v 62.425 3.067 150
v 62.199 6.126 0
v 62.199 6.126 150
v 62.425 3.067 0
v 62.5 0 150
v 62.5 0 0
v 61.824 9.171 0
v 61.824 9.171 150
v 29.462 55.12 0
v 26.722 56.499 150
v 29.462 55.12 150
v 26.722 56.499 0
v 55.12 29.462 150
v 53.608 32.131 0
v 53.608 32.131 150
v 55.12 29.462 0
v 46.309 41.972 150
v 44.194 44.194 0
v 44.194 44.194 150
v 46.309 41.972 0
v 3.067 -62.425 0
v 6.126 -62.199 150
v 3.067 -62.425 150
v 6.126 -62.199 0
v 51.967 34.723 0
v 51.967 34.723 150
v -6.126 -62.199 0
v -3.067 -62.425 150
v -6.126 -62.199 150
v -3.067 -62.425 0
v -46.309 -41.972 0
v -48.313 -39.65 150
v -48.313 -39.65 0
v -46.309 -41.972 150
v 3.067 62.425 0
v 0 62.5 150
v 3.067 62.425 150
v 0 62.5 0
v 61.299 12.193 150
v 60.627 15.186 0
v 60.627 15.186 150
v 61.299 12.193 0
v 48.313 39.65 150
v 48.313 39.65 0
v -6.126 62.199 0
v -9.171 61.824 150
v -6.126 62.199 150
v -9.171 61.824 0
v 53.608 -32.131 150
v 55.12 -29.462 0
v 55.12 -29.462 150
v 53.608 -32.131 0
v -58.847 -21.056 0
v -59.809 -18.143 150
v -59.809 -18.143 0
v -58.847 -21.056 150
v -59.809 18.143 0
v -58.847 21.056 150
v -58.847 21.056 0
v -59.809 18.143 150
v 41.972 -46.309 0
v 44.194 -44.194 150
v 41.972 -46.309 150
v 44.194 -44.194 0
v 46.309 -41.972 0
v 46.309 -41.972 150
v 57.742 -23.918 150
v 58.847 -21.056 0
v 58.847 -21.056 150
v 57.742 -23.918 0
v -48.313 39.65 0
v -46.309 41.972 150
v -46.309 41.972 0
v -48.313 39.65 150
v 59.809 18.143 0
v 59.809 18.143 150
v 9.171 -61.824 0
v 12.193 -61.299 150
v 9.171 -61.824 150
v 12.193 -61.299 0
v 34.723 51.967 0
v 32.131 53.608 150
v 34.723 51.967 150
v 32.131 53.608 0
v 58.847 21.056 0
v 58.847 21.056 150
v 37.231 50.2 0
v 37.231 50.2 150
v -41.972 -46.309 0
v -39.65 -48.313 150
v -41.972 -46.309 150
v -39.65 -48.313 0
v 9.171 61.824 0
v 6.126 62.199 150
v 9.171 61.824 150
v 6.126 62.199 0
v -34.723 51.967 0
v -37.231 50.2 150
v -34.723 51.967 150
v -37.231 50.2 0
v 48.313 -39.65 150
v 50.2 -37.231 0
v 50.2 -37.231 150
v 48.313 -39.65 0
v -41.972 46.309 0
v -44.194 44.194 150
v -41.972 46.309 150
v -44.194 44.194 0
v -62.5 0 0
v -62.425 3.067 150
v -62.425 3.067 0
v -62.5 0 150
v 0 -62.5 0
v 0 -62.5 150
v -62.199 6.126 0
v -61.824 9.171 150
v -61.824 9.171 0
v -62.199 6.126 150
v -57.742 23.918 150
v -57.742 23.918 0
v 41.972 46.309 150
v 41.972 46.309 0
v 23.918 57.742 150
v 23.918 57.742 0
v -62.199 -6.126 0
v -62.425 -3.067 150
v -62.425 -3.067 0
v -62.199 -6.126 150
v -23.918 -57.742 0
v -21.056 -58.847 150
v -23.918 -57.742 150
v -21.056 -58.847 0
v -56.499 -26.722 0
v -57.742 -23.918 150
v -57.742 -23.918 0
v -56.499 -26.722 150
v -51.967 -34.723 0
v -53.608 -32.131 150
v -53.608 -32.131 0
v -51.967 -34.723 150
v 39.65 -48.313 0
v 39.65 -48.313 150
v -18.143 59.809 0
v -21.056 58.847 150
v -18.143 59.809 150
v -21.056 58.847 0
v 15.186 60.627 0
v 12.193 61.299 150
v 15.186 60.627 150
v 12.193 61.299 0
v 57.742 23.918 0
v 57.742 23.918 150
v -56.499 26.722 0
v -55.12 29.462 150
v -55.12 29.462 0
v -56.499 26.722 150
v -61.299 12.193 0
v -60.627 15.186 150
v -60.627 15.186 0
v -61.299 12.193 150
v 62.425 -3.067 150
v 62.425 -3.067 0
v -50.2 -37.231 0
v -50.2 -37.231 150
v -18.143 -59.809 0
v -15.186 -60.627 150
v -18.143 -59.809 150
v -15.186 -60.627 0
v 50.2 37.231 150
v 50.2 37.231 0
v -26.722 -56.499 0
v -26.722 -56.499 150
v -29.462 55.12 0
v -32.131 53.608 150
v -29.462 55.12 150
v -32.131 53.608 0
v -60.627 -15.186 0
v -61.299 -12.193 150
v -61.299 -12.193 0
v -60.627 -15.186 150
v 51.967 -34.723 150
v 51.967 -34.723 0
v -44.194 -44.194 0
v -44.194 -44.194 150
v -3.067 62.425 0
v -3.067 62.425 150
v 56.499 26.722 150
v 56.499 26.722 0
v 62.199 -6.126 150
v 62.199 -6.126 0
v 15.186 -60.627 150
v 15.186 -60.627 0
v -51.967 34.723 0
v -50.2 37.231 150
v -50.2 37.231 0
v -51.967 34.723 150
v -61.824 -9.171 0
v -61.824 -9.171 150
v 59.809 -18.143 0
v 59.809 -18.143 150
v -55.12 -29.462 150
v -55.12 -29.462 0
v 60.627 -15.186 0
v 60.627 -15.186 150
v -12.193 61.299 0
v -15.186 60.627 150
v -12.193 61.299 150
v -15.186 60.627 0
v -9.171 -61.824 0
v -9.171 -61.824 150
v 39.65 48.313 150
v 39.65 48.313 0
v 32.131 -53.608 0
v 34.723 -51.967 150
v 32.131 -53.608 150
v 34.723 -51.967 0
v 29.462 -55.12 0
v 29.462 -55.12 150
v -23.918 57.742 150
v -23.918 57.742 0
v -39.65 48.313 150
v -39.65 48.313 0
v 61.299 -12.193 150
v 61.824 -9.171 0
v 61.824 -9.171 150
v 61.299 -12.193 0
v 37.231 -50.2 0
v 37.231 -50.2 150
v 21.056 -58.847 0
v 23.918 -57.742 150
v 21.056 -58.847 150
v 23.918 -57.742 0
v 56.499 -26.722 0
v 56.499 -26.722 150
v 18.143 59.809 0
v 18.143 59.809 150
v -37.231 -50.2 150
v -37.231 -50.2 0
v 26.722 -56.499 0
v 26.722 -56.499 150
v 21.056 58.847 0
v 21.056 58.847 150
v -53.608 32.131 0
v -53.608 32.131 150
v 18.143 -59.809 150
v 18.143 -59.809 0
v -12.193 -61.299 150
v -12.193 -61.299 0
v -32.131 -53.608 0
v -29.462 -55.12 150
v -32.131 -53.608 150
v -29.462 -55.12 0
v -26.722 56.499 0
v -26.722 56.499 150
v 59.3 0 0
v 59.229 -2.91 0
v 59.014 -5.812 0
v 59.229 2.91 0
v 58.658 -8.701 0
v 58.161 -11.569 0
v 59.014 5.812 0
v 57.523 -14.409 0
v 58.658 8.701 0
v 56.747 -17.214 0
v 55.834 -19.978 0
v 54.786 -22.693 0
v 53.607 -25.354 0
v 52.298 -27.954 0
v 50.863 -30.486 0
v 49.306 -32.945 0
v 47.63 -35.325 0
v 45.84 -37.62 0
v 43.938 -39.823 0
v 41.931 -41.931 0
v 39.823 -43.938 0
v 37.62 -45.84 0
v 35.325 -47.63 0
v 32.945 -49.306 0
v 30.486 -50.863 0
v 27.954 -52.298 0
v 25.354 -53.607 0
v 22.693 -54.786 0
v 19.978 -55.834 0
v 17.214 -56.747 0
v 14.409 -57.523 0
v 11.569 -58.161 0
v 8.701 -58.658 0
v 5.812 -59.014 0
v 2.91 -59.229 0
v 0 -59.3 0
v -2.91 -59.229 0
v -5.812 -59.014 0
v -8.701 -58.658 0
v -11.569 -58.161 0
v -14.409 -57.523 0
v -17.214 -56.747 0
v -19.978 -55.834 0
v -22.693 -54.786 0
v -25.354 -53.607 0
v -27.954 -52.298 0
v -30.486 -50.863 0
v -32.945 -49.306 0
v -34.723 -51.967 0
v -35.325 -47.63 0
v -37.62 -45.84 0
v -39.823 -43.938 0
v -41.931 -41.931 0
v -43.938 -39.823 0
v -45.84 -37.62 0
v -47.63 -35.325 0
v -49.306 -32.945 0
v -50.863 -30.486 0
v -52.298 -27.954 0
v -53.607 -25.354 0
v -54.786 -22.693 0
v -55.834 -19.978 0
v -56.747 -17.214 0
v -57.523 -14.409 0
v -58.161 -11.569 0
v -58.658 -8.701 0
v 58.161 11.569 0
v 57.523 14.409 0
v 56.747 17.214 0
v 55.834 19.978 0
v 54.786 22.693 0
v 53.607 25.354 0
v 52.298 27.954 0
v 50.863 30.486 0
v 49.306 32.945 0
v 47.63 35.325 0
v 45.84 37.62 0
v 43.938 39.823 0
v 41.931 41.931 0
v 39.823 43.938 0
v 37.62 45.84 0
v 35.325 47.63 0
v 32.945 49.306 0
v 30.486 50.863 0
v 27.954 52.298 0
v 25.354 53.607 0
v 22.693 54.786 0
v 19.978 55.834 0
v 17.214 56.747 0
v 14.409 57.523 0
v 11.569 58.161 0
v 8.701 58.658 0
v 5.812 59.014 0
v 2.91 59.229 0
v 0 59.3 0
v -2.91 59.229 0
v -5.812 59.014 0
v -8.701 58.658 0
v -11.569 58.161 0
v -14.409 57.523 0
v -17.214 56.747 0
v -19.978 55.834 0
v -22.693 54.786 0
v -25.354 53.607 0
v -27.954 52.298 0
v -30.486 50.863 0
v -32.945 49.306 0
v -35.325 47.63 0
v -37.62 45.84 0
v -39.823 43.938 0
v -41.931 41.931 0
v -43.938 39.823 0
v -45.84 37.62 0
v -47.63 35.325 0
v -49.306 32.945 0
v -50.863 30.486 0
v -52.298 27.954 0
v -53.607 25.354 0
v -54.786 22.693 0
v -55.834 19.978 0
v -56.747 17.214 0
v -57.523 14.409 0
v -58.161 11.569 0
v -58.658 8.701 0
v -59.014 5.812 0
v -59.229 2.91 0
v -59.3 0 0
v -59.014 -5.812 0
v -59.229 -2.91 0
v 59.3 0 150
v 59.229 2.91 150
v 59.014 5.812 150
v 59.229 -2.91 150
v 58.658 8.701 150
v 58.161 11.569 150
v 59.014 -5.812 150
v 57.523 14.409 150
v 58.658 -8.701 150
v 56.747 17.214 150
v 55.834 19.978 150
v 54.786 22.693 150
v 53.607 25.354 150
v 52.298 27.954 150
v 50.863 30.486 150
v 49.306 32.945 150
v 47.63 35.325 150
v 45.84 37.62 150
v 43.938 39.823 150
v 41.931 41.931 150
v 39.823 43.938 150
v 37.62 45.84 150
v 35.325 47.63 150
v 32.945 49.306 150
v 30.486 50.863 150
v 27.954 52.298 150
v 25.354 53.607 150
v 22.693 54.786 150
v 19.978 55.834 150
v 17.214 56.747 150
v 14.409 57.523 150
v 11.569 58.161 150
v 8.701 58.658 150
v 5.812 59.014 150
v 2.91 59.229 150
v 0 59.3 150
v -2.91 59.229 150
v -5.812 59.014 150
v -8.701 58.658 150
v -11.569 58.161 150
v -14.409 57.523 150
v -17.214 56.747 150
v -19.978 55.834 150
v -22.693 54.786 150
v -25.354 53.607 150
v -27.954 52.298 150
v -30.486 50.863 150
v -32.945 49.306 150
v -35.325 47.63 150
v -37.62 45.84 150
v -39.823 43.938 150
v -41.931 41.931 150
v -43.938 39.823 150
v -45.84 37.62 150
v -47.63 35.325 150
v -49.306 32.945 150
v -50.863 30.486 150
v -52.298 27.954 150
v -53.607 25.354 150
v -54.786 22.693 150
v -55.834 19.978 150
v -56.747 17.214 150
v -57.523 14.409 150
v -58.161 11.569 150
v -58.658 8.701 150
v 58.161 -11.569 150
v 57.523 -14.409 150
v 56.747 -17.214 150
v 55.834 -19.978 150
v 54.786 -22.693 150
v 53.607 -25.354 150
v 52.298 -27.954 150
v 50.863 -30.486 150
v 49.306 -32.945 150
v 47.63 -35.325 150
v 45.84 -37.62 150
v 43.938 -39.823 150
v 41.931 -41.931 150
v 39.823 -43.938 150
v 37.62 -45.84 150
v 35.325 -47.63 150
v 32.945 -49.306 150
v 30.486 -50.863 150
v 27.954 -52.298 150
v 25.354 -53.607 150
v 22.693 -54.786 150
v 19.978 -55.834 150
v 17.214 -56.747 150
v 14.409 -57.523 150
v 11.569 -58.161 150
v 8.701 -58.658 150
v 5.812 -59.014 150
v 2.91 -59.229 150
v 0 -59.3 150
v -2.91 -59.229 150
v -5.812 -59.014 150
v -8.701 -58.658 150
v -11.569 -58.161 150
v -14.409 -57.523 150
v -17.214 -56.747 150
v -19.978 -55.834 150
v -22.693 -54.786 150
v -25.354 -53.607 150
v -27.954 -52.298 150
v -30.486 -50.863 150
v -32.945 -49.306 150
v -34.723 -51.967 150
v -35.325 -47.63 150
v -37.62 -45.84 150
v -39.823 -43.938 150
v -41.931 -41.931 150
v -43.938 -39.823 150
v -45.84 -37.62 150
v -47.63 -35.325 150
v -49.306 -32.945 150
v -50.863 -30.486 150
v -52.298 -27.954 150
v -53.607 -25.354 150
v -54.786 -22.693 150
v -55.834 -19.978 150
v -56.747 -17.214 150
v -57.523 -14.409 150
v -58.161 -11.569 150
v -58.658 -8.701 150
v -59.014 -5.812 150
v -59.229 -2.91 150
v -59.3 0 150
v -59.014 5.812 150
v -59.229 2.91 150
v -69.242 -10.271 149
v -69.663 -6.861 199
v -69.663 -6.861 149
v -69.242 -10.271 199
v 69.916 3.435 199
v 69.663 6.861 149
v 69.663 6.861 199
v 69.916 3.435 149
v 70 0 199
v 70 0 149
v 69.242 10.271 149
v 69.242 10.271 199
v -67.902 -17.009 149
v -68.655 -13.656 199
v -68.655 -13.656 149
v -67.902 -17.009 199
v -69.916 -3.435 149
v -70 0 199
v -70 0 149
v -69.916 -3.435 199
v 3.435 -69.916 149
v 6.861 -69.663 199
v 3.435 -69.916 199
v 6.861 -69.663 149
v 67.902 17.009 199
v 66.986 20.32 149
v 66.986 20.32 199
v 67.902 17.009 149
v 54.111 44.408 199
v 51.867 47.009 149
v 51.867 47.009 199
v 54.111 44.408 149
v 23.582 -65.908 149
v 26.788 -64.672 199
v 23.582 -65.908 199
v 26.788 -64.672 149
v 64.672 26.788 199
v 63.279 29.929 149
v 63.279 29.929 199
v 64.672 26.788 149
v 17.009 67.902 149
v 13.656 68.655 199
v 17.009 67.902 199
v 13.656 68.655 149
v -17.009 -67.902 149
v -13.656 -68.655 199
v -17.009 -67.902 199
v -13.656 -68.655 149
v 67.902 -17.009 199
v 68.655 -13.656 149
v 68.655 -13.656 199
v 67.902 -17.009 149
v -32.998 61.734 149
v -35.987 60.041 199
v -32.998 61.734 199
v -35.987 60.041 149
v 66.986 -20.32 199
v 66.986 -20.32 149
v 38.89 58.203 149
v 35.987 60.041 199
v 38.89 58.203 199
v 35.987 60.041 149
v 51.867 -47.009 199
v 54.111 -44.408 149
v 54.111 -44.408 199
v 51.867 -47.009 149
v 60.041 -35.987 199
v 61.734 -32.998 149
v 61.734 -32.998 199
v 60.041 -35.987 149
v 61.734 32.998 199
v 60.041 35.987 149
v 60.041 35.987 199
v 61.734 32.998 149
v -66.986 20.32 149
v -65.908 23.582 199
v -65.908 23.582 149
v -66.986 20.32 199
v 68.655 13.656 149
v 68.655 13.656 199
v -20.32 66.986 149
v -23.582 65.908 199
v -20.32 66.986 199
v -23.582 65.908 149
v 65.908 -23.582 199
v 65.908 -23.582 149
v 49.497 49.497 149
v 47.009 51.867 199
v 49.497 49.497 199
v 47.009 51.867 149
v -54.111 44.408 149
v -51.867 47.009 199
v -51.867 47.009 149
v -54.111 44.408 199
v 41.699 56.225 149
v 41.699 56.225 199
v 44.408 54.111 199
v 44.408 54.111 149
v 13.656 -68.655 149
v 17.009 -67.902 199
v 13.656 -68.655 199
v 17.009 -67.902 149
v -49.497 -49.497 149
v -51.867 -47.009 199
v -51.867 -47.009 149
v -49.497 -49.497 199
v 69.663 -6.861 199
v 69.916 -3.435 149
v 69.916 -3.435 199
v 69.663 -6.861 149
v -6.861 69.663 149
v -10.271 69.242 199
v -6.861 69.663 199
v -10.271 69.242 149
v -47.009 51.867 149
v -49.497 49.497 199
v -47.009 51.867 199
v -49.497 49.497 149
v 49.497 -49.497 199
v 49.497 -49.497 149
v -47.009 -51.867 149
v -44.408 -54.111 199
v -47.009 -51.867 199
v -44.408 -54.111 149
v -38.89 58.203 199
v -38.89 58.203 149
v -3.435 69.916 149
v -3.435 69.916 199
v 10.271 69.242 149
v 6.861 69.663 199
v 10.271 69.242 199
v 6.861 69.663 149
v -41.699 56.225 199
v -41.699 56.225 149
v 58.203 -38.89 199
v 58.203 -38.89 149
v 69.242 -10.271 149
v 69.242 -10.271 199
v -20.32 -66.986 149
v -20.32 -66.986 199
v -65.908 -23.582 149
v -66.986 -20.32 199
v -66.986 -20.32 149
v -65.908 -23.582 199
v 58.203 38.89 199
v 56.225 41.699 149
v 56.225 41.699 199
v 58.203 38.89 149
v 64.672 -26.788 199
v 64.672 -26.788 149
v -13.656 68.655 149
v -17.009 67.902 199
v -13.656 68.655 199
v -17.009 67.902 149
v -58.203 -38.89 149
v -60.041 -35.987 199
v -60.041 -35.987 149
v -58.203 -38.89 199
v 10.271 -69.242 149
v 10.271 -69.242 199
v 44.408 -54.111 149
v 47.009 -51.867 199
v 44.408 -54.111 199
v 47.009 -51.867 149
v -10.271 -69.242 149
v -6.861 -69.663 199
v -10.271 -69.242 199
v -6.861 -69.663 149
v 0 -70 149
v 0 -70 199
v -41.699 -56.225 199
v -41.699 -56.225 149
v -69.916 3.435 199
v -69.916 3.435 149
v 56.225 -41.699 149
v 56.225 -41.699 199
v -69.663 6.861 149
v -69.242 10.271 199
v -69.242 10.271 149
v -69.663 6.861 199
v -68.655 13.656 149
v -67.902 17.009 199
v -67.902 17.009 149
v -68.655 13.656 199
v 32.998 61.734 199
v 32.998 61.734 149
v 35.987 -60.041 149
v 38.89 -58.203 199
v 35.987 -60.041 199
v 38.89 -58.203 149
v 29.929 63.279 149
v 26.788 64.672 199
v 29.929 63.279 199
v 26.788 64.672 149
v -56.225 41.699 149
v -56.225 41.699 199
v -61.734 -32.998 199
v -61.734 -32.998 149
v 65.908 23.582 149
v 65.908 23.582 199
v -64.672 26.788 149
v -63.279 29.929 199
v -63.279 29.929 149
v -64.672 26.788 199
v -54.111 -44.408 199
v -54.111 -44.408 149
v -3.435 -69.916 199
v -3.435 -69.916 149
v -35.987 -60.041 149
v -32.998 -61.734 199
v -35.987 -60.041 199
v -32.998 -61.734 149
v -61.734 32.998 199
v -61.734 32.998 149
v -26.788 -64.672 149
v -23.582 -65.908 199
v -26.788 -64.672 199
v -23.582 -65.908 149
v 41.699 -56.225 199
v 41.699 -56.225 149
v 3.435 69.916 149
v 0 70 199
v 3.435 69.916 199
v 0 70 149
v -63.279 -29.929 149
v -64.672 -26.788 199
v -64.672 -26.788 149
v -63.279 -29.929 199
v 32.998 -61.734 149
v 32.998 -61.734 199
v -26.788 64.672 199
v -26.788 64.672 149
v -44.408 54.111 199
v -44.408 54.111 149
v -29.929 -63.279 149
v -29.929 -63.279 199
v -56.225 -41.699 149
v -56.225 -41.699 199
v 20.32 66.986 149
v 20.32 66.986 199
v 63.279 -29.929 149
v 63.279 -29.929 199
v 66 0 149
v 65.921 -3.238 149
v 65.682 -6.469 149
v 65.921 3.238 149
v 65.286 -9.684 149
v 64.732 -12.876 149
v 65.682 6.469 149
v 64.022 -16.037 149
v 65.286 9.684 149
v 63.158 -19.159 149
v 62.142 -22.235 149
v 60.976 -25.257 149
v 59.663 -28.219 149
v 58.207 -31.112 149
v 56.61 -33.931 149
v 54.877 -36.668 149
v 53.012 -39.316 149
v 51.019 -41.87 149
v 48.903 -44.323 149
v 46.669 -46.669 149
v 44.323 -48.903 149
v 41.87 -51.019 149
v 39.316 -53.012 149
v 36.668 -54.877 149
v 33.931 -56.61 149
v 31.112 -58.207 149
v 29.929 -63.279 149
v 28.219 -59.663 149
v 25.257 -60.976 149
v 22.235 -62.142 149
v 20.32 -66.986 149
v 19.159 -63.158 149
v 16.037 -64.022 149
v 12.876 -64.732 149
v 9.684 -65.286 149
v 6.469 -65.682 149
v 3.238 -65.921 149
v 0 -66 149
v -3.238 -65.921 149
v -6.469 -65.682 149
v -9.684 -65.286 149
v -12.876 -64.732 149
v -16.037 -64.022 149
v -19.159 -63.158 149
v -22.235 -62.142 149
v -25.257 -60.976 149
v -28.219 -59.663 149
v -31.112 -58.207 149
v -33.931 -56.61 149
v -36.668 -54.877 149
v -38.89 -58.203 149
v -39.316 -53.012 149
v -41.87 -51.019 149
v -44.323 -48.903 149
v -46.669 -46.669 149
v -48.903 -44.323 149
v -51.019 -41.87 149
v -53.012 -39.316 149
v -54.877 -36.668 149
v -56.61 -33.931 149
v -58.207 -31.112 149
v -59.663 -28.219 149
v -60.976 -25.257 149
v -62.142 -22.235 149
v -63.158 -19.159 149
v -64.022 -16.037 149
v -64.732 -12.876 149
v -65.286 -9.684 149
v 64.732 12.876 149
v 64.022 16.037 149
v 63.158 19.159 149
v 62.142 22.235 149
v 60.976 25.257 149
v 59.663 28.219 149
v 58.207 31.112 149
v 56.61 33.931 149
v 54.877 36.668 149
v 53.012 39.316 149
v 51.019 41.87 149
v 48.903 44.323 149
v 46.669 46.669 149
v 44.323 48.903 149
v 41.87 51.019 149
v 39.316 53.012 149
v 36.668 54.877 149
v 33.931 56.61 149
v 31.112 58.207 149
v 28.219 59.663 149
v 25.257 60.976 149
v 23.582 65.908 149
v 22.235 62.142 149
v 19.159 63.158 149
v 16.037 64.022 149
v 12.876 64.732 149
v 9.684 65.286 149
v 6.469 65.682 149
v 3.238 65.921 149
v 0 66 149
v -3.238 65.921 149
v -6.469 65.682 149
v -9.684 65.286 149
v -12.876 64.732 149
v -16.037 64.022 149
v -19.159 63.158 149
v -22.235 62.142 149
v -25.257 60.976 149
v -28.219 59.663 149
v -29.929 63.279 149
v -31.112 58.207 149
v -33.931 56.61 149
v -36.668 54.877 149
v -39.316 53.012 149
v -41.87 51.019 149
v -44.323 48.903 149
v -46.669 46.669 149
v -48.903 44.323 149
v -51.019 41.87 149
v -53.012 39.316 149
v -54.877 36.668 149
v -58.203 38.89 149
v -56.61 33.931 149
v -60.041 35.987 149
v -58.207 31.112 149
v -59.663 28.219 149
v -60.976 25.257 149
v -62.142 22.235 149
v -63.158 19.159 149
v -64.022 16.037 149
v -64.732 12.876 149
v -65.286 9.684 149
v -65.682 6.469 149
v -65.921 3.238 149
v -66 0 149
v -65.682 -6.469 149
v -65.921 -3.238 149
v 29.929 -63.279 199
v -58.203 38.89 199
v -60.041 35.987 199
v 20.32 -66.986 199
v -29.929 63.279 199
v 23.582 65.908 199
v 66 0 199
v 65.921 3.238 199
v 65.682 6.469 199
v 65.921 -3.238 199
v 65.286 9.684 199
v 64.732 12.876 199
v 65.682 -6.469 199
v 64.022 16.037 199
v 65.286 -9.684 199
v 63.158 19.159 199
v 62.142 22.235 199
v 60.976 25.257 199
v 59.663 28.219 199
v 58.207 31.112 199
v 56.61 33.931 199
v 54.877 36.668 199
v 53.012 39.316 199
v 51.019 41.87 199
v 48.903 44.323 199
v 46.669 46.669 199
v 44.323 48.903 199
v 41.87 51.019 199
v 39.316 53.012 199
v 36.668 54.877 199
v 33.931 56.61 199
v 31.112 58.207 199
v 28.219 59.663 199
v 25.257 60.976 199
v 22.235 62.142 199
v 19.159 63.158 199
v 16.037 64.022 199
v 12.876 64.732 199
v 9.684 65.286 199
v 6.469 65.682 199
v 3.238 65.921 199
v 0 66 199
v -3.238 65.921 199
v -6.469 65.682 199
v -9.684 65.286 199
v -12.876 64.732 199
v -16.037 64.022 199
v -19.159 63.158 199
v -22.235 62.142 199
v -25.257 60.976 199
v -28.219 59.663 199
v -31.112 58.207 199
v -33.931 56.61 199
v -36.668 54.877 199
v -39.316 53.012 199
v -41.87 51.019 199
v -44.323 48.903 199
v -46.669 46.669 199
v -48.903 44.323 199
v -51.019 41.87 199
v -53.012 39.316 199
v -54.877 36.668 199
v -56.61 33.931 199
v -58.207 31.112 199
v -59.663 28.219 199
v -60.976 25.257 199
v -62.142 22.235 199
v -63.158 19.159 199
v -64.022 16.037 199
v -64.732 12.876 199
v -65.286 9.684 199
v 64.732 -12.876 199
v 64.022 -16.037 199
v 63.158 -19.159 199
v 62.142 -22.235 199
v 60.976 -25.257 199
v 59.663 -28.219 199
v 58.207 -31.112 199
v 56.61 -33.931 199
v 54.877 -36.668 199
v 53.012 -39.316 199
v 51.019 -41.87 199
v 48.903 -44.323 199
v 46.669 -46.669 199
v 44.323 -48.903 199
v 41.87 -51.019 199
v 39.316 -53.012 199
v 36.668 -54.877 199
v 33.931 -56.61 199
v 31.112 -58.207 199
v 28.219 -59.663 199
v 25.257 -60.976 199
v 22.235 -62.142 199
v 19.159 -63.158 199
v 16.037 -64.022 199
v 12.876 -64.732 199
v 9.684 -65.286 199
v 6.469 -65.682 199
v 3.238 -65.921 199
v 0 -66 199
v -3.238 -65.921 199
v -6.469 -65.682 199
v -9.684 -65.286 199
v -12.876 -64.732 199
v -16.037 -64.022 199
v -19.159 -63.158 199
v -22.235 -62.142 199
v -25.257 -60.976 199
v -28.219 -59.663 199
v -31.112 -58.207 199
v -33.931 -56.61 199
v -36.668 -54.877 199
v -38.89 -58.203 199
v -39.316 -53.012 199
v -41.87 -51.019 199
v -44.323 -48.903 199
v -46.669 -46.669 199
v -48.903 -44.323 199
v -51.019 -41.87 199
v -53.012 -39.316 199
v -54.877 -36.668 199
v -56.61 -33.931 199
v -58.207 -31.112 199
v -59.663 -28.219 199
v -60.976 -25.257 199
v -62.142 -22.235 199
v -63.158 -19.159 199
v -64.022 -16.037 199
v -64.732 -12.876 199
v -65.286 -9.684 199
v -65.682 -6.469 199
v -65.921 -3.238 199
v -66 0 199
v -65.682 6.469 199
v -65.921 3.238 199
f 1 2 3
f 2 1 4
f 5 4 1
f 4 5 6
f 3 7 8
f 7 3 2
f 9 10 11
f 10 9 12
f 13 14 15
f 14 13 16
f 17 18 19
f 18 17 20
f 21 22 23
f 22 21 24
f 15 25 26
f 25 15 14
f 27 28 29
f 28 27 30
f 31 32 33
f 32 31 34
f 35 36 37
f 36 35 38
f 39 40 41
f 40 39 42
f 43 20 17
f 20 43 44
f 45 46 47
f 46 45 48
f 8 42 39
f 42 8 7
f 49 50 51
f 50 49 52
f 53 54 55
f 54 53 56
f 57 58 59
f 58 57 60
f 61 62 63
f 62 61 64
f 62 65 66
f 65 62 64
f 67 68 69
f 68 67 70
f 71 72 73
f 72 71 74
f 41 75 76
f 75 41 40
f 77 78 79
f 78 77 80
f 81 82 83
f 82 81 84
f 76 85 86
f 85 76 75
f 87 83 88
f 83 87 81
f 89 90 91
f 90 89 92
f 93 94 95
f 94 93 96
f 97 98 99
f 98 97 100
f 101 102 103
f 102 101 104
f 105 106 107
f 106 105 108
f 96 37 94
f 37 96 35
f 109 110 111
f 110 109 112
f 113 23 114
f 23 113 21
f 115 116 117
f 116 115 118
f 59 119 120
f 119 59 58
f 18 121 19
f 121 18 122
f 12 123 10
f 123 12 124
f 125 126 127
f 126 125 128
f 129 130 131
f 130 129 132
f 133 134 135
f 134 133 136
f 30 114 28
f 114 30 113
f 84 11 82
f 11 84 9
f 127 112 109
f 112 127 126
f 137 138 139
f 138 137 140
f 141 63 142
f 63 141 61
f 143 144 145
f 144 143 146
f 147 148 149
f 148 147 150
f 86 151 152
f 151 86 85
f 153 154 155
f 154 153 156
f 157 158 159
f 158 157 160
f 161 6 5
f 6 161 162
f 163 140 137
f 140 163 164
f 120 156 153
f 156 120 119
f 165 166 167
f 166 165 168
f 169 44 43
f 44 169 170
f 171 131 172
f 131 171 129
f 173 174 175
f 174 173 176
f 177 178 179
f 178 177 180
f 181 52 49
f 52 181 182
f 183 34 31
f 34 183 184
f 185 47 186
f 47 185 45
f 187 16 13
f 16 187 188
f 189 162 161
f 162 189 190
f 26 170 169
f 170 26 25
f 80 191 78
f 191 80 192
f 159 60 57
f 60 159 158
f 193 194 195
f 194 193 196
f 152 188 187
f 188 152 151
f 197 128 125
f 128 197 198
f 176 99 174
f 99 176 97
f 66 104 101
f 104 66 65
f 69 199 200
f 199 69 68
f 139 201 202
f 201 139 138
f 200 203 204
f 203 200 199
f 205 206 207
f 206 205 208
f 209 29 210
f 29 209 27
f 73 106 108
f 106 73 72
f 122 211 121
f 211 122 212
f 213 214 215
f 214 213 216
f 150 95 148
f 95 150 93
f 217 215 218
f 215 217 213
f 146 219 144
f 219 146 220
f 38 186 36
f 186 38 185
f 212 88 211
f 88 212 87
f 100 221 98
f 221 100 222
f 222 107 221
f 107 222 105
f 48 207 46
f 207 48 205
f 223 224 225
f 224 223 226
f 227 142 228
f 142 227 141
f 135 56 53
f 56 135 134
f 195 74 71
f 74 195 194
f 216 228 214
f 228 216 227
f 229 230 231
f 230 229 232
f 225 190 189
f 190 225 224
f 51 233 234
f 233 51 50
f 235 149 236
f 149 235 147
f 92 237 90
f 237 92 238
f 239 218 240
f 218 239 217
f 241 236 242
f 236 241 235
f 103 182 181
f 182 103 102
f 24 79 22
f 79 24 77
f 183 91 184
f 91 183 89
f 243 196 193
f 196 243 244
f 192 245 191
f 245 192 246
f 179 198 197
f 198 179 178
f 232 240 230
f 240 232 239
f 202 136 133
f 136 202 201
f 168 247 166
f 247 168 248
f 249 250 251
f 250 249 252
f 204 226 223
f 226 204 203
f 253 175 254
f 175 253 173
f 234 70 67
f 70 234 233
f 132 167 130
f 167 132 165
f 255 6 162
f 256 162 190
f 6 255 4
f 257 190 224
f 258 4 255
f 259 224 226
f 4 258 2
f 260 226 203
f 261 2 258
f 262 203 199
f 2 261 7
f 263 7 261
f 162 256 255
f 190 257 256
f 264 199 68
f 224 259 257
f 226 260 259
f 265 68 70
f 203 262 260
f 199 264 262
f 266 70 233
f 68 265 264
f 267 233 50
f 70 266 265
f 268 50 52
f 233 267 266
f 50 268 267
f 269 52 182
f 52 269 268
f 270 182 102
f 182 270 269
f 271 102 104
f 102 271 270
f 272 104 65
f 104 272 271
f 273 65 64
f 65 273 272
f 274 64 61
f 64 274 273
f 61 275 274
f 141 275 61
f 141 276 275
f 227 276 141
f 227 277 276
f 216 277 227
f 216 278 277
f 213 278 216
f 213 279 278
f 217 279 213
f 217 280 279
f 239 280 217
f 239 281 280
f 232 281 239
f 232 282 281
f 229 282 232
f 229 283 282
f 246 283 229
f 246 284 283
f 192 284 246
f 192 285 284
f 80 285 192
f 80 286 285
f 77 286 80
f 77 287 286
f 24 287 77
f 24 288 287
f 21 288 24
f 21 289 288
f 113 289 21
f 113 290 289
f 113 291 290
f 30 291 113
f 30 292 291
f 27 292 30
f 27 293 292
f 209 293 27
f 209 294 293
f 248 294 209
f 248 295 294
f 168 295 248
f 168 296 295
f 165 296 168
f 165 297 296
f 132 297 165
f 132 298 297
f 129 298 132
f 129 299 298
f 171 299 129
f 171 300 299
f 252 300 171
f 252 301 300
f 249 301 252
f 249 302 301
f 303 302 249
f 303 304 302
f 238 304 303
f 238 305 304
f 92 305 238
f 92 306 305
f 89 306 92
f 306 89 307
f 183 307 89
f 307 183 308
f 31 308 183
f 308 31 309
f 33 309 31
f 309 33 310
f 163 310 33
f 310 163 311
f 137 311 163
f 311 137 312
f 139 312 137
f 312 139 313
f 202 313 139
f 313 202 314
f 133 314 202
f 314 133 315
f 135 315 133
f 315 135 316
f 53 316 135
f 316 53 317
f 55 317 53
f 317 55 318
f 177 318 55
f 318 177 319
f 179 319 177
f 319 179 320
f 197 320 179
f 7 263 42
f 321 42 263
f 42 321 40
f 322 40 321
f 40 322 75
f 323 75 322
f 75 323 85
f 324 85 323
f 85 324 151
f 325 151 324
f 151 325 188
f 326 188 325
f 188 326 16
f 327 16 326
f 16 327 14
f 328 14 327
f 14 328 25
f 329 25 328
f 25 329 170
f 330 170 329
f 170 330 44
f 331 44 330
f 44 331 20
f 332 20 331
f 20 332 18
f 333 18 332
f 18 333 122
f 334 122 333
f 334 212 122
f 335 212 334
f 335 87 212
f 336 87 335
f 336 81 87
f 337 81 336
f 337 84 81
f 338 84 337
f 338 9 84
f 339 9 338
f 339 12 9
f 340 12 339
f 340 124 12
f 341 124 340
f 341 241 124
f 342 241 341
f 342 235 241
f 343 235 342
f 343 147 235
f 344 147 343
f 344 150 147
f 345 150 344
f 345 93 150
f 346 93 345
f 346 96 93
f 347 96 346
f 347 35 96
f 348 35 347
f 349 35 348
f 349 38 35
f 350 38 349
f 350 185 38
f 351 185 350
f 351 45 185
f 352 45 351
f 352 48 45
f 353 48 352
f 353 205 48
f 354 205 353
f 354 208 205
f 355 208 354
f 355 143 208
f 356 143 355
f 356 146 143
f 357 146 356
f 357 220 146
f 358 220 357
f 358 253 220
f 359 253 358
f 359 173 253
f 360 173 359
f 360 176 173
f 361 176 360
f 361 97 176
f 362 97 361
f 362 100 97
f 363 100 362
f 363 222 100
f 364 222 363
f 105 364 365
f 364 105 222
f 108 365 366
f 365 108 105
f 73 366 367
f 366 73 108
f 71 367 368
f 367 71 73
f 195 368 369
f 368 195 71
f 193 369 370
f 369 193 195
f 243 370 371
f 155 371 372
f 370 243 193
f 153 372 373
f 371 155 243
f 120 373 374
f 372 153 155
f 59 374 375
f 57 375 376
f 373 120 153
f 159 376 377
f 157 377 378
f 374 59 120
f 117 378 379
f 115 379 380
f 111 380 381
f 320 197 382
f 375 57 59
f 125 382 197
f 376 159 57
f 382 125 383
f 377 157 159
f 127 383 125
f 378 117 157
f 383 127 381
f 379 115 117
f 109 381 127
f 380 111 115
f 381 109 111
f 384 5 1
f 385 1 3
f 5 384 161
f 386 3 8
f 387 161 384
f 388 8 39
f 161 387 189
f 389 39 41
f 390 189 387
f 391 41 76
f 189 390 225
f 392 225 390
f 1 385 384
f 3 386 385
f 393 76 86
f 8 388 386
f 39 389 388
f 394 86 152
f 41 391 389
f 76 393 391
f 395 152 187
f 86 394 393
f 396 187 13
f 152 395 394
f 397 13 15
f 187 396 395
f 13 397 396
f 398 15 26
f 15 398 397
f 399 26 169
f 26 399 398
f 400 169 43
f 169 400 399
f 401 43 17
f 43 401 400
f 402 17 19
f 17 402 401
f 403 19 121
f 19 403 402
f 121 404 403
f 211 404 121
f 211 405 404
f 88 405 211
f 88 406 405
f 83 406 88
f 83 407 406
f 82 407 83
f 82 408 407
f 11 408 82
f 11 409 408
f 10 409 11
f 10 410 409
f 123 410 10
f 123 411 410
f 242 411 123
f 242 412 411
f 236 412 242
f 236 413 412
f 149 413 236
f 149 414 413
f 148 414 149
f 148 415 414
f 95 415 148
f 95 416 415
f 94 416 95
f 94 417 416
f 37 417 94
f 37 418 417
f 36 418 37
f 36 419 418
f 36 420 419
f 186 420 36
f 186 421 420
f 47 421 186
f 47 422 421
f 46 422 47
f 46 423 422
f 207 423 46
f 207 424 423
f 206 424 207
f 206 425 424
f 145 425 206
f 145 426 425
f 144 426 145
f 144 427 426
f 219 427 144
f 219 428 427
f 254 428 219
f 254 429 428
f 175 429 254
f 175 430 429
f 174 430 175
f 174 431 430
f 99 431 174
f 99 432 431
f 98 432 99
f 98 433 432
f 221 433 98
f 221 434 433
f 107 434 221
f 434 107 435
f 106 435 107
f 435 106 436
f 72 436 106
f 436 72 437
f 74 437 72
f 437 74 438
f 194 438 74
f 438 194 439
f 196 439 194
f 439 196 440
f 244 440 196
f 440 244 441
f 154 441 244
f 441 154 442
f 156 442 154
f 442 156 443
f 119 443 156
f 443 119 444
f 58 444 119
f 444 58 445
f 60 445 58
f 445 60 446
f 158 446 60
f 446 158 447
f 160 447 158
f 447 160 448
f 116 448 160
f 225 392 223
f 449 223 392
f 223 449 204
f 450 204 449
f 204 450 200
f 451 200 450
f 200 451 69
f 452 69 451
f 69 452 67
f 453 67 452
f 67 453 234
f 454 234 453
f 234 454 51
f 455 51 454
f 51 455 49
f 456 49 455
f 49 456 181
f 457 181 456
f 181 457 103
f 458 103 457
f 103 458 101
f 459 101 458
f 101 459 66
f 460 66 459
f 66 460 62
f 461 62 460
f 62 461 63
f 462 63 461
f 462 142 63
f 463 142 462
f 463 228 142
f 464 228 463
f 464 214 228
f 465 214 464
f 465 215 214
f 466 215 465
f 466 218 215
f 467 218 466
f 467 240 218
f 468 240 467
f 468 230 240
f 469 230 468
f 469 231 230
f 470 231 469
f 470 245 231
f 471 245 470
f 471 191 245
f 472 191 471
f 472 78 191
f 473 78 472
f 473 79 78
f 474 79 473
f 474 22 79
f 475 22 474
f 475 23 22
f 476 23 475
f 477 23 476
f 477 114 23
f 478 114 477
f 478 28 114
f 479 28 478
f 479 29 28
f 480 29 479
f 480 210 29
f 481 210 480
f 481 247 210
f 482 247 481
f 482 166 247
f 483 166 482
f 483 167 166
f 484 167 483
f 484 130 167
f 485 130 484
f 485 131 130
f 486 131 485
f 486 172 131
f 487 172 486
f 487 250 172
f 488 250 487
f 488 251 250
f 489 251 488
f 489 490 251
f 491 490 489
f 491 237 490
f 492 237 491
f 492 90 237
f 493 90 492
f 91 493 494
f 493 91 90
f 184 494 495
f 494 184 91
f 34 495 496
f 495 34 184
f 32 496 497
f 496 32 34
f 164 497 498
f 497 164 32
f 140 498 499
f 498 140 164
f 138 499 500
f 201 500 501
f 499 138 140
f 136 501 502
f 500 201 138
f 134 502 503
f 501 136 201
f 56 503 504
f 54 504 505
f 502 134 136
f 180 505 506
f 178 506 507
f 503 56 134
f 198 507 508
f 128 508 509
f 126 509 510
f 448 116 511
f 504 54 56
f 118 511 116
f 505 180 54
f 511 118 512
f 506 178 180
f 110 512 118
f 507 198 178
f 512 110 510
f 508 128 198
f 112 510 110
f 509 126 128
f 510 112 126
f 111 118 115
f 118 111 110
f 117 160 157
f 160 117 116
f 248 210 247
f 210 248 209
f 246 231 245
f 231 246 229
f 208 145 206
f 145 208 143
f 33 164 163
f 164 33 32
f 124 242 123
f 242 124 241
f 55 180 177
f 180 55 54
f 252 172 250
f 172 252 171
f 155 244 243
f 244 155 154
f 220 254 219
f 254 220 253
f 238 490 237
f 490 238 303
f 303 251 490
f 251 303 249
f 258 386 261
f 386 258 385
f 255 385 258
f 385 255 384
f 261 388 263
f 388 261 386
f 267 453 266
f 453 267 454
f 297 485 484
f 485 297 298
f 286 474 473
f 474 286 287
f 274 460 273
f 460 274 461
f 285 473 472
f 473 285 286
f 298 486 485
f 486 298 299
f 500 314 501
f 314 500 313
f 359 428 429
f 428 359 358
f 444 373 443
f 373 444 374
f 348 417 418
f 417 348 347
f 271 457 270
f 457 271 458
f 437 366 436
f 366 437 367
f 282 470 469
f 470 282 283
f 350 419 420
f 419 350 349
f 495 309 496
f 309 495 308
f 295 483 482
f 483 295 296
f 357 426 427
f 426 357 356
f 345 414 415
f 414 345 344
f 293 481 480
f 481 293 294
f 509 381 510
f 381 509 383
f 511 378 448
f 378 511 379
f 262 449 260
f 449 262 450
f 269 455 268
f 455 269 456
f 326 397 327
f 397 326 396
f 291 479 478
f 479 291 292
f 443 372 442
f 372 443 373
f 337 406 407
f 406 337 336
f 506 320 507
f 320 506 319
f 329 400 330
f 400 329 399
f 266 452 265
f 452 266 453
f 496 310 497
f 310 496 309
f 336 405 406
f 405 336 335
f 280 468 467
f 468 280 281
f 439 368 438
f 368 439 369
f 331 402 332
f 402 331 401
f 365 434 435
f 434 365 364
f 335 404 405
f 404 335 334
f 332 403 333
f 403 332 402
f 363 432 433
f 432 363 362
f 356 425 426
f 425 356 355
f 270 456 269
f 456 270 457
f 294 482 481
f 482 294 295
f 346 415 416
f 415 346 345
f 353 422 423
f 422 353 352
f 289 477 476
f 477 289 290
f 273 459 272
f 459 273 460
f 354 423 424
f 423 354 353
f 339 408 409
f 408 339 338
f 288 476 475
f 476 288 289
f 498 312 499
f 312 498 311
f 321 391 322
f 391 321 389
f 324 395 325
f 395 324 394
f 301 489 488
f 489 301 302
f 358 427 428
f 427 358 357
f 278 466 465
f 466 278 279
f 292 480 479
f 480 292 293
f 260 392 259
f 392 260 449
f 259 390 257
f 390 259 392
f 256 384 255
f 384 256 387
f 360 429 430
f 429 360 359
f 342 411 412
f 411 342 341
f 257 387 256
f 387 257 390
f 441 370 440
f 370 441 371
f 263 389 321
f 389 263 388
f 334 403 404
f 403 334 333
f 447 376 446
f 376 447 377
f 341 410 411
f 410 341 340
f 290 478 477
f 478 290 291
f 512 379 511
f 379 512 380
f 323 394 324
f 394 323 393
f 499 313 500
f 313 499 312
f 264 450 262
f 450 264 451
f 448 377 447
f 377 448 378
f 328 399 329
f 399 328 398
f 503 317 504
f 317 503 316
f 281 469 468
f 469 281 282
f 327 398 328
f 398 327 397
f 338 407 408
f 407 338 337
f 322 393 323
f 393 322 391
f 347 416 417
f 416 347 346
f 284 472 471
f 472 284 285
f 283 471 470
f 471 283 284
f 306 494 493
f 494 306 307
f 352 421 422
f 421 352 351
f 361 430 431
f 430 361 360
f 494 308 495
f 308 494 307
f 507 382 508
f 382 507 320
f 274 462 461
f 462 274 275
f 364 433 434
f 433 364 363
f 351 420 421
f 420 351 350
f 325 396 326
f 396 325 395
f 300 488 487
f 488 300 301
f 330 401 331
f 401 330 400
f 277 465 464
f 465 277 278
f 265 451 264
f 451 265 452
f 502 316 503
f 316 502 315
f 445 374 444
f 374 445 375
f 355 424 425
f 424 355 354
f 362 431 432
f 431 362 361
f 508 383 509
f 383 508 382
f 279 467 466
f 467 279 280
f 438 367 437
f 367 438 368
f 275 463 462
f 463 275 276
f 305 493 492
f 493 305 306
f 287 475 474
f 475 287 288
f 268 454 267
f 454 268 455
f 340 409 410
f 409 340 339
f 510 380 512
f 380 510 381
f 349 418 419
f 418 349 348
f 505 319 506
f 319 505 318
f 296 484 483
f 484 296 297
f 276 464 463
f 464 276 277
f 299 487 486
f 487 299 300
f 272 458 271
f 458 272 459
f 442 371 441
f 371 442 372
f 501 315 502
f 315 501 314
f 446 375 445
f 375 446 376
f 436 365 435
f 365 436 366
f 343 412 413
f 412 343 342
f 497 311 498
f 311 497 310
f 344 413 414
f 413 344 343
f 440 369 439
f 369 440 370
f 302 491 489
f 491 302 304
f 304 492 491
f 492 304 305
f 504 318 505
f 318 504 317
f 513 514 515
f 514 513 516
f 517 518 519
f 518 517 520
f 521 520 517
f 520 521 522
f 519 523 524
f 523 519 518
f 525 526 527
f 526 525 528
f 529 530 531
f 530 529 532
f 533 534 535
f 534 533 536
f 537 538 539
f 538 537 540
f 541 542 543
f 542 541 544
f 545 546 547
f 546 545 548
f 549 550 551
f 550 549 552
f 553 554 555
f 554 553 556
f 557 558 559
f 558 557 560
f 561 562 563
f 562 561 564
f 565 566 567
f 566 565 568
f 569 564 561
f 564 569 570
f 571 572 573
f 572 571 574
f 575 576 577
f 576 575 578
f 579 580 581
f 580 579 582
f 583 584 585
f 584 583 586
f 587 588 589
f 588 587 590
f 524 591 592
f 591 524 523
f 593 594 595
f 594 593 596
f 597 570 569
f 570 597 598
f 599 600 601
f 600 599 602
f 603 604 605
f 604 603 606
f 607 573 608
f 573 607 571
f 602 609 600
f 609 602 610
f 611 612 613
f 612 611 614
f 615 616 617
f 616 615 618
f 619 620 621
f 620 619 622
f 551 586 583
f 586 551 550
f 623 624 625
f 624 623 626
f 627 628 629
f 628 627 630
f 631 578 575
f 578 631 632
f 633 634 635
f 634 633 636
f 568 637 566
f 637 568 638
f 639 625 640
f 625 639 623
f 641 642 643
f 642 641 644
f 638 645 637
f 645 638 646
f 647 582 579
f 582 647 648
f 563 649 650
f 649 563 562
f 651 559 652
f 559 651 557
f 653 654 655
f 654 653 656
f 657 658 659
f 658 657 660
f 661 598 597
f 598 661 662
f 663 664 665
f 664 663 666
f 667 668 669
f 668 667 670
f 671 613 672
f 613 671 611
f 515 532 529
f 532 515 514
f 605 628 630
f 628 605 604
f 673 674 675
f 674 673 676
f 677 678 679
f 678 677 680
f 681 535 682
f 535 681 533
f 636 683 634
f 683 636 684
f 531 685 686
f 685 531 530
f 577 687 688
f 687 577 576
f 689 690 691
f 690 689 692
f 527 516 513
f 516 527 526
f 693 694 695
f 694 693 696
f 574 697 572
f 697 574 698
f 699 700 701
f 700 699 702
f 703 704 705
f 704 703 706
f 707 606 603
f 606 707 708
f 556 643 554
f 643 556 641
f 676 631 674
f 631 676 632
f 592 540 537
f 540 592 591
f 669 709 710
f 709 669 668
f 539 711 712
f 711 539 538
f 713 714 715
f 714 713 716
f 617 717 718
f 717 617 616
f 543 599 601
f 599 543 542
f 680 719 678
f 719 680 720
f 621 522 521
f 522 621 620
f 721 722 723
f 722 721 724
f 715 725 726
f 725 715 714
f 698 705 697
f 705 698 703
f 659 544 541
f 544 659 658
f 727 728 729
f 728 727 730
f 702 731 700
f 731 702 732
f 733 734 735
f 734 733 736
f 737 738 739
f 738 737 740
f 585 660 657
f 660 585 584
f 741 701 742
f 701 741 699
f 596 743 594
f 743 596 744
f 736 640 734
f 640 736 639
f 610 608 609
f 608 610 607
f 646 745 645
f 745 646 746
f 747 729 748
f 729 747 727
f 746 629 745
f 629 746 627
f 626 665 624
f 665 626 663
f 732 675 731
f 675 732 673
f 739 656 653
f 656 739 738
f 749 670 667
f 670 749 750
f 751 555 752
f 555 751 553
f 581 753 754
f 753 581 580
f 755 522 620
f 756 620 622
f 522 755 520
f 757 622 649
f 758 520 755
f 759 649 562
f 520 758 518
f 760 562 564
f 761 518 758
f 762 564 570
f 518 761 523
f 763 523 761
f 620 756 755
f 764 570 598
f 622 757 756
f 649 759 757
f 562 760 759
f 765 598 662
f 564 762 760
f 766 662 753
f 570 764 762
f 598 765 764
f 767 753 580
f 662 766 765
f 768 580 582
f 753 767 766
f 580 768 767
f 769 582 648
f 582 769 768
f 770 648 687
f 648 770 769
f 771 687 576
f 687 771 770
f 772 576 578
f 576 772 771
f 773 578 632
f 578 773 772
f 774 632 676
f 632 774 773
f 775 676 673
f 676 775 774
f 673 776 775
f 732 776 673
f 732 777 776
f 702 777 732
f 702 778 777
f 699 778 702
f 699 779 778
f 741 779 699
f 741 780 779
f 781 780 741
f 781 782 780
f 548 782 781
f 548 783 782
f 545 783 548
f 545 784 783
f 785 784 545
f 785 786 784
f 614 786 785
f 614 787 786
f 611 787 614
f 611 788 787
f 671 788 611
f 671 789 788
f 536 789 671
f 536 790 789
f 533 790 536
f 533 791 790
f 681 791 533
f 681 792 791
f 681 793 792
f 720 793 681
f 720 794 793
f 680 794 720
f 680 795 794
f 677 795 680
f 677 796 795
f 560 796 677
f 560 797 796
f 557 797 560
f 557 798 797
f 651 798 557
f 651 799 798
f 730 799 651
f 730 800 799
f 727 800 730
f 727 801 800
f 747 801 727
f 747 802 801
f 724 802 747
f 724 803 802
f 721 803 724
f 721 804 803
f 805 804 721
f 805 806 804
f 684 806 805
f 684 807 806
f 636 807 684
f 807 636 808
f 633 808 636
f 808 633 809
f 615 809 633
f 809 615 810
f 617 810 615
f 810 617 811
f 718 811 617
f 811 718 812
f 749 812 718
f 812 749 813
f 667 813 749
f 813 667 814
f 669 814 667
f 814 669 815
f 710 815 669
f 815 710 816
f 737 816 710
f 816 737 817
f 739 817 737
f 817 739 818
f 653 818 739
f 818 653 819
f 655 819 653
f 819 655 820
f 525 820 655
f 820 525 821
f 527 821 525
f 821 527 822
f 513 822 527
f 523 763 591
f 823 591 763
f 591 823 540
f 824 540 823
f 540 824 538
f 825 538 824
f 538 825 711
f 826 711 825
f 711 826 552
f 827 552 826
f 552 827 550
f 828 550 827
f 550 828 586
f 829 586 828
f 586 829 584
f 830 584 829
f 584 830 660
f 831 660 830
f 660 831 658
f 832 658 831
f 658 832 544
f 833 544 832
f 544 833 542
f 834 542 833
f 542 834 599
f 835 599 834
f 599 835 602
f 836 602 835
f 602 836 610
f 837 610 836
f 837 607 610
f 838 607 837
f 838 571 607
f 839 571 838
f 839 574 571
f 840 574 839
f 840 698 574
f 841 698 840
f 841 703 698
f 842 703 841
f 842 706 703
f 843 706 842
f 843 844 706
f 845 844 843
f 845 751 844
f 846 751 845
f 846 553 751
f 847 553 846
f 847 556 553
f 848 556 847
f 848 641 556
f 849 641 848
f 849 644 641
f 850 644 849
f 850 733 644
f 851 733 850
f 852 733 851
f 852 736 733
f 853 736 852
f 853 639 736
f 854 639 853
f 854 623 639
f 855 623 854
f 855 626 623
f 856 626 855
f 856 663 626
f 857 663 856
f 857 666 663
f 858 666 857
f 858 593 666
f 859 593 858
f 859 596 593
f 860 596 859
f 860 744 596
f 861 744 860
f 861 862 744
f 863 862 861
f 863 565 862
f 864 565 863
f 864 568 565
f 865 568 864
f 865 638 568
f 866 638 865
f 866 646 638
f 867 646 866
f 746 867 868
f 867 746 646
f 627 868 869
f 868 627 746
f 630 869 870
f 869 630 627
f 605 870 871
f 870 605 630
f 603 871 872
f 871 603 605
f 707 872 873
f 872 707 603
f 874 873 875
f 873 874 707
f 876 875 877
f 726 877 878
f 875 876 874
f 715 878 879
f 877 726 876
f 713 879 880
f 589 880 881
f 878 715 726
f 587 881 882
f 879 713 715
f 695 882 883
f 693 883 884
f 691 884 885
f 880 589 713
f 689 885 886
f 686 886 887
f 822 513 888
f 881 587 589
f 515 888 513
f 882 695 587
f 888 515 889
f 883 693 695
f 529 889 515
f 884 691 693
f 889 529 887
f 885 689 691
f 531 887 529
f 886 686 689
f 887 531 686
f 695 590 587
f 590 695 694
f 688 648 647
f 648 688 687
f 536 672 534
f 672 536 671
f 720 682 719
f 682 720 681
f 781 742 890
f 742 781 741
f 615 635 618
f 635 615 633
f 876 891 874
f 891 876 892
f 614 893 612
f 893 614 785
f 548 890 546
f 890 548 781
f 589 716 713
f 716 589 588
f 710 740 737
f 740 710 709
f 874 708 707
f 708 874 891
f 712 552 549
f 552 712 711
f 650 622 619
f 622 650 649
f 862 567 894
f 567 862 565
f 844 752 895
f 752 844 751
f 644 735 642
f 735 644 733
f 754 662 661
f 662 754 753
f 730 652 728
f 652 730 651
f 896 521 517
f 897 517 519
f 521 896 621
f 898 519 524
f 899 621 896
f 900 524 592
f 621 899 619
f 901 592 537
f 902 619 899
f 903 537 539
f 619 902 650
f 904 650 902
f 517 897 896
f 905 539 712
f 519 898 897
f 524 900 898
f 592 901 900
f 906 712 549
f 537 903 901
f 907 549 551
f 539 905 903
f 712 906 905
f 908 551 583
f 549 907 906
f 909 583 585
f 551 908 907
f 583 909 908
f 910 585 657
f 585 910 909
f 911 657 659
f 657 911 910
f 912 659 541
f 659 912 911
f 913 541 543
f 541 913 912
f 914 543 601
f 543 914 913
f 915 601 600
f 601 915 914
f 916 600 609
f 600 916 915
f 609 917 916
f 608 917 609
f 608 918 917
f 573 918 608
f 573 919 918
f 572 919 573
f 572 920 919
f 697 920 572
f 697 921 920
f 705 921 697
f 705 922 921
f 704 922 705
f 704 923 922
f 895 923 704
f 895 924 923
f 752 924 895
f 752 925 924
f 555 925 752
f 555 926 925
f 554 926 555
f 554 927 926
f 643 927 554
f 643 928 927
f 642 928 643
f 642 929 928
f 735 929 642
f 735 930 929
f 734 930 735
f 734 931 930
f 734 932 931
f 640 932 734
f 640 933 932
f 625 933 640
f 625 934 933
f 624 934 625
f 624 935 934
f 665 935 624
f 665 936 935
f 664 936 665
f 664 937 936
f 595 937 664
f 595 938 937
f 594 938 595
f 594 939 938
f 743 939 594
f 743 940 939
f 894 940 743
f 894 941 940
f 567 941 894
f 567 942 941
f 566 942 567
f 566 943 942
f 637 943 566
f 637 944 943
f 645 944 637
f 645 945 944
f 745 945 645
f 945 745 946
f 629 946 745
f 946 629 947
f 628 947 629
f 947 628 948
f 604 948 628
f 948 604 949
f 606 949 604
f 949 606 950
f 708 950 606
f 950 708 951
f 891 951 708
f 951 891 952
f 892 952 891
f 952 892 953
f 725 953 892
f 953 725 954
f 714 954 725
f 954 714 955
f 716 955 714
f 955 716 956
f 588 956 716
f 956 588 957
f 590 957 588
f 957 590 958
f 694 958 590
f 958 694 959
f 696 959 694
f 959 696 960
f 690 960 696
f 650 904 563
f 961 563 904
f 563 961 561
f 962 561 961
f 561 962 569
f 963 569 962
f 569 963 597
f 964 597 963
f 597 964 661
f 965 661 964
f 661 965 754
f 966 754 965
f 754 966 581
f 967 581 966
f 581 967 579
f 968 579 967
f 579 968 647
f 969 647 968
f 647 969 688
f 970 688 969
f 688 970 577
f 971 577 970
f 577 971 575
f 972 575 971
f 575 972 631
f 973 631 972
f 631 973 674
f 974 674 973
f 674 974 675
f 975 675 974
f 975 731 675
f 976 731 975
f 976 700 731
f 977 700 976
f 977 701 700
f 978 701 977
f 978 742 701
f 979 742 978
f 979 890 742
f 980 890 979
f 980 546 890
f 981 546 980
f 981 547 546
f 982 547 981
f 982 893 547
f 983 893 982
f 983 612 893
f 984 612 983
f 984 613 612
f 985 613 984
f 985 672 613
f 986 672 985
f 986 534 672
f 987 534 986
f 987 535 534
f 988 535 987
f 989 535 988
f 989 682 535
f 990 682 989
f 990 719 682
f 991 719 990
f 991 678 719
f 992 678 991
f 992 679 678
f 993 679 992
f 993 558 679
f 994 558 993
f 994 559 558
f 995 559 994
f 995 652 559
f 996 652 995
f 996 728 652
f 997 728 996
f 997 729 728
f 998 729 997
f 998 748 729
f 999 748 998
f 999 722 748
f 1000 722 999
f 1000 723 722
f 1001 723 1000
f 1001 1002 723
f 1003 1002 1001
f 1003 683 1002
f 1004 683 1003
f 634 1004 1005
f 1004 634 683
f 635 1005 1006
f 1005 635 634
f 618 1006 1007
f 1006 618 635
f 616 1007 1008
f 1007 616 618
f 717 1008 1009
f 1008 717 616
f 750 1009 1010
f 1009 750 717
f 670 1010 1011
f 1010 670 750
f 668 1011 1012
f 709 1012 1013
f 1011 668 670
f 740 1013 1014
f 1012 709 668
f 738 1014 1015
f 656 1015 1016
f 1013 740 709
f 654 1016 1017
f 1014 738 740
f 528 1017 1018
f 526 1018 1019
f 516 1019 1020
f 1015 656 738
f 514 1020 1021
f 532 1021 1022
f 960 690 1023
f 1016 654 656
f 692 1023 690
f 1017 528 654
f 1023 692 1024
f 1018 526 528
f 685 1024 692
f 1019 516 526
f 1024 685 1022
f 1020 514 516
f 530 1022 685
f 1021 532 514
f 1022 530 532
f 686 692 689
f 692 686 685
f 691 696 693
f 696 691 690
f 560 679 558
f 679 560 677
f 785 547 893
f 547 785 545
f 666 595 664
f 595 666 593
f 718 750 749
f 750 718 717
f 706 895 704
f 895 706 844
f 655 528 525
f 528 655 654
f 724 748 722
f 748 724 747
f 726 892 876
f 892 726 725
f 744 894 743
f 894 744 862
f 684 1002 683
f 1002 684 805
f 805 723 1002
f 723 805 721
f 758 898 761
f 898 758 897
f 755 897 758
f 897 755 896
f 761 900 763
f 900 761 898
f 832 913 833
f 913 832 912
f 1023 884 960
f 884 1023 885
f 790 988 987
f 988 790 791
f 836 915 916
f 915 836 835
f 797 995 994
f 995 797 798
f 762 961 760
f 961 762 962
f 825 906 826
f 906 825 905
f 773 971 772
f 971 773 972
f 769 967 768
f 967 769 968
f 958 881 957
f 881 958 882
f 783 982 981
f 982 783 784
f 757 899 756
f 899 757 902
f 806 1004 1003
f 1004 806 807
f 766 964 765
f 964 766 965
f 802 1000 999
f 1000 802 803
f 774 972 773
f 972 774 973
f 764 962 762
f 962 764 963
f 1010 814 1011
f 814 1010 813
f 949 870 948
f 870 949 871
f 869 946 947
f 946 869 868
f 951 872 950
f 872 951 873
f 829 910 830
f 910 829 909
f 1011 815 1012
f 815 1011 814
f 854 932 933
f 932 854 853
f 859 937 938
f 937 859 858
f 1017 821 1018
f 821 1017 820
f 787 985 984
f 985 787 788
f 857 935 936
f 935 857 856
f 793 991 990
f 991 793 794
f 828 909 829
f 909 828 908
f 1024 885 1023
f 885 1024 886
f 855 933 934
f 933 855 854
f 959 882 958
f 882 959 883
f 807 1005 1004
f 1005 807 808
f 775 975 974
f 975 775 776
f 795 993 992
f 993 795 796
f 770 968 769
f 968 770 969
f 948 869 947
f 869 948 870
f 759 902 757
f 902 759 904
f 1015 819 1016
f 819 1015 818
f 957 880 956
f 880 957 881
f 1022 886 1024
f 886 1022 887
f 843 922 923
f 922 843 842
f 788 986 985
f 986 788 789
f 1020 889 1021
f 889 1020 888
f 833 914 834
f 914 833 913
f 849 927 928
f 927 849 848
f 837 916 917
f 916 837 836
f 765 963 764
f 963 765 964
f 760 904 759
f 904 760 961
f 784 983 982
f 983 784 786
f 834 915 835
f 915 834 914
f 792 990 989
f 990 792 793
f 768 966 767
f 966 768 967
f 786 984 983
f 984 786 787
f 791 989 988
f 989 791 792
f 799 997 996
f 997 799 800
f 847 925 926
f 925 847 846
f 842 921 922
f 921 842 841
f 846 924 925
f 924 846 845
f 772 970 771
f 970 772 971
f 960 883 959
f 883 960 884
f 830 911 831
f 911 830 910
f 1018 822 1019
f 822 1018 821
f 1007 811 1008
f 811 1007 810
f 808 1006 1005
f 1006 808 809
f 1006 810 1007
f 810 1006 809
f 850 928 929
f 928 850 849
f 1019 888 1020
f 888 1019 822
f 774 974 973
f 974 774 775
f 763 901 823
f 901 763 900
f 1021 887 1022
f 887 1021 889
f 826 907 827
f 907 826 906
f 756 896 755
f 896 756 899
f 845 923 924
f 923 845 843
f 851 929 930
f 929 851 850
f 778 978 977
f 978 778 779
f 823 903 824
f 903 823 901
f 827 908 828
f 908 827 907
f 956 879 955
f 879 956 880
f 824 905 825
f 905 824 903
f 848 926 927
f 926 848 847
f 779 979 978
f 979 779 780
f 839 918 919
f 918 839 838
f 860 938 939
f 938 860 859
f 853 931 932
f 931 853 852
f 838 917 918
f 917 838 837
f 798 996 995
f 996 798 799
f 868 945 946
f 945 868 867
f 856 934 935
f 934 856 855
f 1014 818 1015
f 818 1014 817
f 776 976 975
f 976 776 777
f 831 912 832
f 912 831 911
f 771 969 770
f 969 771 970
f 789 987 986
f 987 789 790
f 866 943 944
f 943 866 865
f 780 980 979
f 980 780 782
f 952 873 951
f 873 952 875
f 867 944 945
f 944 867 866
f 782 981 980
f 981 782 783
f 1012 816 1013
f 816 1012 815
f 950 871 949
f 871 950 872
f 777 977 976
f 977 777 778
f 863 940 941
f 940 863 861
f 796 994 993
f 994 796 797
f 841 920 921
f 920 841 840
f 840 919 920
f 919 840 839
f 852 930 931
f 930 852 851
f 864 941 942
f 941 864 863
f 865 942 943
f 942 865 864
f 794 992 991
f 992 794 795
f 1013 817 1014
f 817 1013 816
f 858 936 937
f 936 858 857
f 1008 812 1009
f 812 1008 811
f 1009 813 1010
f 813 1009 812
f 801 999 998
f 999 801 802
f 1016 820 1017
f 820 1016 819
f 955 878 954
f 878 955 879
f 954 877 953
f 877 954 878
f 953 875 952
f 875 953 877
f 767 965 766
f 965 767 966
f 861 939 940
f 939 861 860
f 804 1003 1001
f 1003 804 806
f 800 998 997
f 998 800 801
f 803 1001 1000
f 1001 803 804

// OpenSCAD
$fn = 128;

// Parameters
length_mm = 150; //[75:300:1]
outer_diameter_mm = 125; //[100:250:1]
wall_thickness_mm = 3.2; //[1.6:6.4:0.1]
inner_diameter_mm = 118.6; //[90:240:0.1]
include_socket_end = 1; //[0:1:1]
socket_length_mm = 50; //[25:100:1]
socket_outer_diameter_mm = 140; //[120:280:1]
socket_wall_thickness_mm = 4; //[2:8:0.1]
socket_inner_diameter_mm = 132; //[110:270:0.1]
overlap_mm = 1; //[0.5:2:0.1]

// Derived (prefer thickness-driven IDs if user changes thickness)
inner_d_from_thickness = outer_diameter_mm - 2*wall_thickness_mm;
socket_inner_d_from_thickness = socket_outer_diameter_mm - 2*socket_wall_thickness_mm;

pipe_id = min(inner_diameter_mm, inner_d_from_thickness);
socket_id = min(socket_inner_diameter_mm, socket_inner_d_from_thickness);

pipe_or = outer_diameter_mm/2;
pipe_ir = pipe_id/2;

socket_or = socket_outer_diameter_mm/2;
socket_ir = socket_id/2;

// Ensure valid, visible geometry
eps = 0.01;
pipe_ir_safe   = max(eps, min(pipe_ir,   pipe_or - eps));
socket_ir_safe = max(eps, min(socket_ir, socket_or - eps));

module tube(h, ro, ri) {
  difference() {
    cylinder(h=h, r=ro, center=false);
    translate([0,0,-overlap_mm])
      cylinder(h=h + 2*overlap_mm, r=ri, center=false);
  }
}

// Complete HT Pipe with optional socket (ONE connected solid)
module ht_pipe() {
  color([0.85, 0.85, 0.8])
  union() {
    // Main pipe
    tube(length_mm, pipe_or, pipe_ir_safe);

    // Socket end connected by overlap
    if (include_socket_end)
      translate([0, 0, length_mm - overlap_mm])
        tube(socket_length_mm, socket_or, socket_ir_safe);
  }
}

ht_pipe();
